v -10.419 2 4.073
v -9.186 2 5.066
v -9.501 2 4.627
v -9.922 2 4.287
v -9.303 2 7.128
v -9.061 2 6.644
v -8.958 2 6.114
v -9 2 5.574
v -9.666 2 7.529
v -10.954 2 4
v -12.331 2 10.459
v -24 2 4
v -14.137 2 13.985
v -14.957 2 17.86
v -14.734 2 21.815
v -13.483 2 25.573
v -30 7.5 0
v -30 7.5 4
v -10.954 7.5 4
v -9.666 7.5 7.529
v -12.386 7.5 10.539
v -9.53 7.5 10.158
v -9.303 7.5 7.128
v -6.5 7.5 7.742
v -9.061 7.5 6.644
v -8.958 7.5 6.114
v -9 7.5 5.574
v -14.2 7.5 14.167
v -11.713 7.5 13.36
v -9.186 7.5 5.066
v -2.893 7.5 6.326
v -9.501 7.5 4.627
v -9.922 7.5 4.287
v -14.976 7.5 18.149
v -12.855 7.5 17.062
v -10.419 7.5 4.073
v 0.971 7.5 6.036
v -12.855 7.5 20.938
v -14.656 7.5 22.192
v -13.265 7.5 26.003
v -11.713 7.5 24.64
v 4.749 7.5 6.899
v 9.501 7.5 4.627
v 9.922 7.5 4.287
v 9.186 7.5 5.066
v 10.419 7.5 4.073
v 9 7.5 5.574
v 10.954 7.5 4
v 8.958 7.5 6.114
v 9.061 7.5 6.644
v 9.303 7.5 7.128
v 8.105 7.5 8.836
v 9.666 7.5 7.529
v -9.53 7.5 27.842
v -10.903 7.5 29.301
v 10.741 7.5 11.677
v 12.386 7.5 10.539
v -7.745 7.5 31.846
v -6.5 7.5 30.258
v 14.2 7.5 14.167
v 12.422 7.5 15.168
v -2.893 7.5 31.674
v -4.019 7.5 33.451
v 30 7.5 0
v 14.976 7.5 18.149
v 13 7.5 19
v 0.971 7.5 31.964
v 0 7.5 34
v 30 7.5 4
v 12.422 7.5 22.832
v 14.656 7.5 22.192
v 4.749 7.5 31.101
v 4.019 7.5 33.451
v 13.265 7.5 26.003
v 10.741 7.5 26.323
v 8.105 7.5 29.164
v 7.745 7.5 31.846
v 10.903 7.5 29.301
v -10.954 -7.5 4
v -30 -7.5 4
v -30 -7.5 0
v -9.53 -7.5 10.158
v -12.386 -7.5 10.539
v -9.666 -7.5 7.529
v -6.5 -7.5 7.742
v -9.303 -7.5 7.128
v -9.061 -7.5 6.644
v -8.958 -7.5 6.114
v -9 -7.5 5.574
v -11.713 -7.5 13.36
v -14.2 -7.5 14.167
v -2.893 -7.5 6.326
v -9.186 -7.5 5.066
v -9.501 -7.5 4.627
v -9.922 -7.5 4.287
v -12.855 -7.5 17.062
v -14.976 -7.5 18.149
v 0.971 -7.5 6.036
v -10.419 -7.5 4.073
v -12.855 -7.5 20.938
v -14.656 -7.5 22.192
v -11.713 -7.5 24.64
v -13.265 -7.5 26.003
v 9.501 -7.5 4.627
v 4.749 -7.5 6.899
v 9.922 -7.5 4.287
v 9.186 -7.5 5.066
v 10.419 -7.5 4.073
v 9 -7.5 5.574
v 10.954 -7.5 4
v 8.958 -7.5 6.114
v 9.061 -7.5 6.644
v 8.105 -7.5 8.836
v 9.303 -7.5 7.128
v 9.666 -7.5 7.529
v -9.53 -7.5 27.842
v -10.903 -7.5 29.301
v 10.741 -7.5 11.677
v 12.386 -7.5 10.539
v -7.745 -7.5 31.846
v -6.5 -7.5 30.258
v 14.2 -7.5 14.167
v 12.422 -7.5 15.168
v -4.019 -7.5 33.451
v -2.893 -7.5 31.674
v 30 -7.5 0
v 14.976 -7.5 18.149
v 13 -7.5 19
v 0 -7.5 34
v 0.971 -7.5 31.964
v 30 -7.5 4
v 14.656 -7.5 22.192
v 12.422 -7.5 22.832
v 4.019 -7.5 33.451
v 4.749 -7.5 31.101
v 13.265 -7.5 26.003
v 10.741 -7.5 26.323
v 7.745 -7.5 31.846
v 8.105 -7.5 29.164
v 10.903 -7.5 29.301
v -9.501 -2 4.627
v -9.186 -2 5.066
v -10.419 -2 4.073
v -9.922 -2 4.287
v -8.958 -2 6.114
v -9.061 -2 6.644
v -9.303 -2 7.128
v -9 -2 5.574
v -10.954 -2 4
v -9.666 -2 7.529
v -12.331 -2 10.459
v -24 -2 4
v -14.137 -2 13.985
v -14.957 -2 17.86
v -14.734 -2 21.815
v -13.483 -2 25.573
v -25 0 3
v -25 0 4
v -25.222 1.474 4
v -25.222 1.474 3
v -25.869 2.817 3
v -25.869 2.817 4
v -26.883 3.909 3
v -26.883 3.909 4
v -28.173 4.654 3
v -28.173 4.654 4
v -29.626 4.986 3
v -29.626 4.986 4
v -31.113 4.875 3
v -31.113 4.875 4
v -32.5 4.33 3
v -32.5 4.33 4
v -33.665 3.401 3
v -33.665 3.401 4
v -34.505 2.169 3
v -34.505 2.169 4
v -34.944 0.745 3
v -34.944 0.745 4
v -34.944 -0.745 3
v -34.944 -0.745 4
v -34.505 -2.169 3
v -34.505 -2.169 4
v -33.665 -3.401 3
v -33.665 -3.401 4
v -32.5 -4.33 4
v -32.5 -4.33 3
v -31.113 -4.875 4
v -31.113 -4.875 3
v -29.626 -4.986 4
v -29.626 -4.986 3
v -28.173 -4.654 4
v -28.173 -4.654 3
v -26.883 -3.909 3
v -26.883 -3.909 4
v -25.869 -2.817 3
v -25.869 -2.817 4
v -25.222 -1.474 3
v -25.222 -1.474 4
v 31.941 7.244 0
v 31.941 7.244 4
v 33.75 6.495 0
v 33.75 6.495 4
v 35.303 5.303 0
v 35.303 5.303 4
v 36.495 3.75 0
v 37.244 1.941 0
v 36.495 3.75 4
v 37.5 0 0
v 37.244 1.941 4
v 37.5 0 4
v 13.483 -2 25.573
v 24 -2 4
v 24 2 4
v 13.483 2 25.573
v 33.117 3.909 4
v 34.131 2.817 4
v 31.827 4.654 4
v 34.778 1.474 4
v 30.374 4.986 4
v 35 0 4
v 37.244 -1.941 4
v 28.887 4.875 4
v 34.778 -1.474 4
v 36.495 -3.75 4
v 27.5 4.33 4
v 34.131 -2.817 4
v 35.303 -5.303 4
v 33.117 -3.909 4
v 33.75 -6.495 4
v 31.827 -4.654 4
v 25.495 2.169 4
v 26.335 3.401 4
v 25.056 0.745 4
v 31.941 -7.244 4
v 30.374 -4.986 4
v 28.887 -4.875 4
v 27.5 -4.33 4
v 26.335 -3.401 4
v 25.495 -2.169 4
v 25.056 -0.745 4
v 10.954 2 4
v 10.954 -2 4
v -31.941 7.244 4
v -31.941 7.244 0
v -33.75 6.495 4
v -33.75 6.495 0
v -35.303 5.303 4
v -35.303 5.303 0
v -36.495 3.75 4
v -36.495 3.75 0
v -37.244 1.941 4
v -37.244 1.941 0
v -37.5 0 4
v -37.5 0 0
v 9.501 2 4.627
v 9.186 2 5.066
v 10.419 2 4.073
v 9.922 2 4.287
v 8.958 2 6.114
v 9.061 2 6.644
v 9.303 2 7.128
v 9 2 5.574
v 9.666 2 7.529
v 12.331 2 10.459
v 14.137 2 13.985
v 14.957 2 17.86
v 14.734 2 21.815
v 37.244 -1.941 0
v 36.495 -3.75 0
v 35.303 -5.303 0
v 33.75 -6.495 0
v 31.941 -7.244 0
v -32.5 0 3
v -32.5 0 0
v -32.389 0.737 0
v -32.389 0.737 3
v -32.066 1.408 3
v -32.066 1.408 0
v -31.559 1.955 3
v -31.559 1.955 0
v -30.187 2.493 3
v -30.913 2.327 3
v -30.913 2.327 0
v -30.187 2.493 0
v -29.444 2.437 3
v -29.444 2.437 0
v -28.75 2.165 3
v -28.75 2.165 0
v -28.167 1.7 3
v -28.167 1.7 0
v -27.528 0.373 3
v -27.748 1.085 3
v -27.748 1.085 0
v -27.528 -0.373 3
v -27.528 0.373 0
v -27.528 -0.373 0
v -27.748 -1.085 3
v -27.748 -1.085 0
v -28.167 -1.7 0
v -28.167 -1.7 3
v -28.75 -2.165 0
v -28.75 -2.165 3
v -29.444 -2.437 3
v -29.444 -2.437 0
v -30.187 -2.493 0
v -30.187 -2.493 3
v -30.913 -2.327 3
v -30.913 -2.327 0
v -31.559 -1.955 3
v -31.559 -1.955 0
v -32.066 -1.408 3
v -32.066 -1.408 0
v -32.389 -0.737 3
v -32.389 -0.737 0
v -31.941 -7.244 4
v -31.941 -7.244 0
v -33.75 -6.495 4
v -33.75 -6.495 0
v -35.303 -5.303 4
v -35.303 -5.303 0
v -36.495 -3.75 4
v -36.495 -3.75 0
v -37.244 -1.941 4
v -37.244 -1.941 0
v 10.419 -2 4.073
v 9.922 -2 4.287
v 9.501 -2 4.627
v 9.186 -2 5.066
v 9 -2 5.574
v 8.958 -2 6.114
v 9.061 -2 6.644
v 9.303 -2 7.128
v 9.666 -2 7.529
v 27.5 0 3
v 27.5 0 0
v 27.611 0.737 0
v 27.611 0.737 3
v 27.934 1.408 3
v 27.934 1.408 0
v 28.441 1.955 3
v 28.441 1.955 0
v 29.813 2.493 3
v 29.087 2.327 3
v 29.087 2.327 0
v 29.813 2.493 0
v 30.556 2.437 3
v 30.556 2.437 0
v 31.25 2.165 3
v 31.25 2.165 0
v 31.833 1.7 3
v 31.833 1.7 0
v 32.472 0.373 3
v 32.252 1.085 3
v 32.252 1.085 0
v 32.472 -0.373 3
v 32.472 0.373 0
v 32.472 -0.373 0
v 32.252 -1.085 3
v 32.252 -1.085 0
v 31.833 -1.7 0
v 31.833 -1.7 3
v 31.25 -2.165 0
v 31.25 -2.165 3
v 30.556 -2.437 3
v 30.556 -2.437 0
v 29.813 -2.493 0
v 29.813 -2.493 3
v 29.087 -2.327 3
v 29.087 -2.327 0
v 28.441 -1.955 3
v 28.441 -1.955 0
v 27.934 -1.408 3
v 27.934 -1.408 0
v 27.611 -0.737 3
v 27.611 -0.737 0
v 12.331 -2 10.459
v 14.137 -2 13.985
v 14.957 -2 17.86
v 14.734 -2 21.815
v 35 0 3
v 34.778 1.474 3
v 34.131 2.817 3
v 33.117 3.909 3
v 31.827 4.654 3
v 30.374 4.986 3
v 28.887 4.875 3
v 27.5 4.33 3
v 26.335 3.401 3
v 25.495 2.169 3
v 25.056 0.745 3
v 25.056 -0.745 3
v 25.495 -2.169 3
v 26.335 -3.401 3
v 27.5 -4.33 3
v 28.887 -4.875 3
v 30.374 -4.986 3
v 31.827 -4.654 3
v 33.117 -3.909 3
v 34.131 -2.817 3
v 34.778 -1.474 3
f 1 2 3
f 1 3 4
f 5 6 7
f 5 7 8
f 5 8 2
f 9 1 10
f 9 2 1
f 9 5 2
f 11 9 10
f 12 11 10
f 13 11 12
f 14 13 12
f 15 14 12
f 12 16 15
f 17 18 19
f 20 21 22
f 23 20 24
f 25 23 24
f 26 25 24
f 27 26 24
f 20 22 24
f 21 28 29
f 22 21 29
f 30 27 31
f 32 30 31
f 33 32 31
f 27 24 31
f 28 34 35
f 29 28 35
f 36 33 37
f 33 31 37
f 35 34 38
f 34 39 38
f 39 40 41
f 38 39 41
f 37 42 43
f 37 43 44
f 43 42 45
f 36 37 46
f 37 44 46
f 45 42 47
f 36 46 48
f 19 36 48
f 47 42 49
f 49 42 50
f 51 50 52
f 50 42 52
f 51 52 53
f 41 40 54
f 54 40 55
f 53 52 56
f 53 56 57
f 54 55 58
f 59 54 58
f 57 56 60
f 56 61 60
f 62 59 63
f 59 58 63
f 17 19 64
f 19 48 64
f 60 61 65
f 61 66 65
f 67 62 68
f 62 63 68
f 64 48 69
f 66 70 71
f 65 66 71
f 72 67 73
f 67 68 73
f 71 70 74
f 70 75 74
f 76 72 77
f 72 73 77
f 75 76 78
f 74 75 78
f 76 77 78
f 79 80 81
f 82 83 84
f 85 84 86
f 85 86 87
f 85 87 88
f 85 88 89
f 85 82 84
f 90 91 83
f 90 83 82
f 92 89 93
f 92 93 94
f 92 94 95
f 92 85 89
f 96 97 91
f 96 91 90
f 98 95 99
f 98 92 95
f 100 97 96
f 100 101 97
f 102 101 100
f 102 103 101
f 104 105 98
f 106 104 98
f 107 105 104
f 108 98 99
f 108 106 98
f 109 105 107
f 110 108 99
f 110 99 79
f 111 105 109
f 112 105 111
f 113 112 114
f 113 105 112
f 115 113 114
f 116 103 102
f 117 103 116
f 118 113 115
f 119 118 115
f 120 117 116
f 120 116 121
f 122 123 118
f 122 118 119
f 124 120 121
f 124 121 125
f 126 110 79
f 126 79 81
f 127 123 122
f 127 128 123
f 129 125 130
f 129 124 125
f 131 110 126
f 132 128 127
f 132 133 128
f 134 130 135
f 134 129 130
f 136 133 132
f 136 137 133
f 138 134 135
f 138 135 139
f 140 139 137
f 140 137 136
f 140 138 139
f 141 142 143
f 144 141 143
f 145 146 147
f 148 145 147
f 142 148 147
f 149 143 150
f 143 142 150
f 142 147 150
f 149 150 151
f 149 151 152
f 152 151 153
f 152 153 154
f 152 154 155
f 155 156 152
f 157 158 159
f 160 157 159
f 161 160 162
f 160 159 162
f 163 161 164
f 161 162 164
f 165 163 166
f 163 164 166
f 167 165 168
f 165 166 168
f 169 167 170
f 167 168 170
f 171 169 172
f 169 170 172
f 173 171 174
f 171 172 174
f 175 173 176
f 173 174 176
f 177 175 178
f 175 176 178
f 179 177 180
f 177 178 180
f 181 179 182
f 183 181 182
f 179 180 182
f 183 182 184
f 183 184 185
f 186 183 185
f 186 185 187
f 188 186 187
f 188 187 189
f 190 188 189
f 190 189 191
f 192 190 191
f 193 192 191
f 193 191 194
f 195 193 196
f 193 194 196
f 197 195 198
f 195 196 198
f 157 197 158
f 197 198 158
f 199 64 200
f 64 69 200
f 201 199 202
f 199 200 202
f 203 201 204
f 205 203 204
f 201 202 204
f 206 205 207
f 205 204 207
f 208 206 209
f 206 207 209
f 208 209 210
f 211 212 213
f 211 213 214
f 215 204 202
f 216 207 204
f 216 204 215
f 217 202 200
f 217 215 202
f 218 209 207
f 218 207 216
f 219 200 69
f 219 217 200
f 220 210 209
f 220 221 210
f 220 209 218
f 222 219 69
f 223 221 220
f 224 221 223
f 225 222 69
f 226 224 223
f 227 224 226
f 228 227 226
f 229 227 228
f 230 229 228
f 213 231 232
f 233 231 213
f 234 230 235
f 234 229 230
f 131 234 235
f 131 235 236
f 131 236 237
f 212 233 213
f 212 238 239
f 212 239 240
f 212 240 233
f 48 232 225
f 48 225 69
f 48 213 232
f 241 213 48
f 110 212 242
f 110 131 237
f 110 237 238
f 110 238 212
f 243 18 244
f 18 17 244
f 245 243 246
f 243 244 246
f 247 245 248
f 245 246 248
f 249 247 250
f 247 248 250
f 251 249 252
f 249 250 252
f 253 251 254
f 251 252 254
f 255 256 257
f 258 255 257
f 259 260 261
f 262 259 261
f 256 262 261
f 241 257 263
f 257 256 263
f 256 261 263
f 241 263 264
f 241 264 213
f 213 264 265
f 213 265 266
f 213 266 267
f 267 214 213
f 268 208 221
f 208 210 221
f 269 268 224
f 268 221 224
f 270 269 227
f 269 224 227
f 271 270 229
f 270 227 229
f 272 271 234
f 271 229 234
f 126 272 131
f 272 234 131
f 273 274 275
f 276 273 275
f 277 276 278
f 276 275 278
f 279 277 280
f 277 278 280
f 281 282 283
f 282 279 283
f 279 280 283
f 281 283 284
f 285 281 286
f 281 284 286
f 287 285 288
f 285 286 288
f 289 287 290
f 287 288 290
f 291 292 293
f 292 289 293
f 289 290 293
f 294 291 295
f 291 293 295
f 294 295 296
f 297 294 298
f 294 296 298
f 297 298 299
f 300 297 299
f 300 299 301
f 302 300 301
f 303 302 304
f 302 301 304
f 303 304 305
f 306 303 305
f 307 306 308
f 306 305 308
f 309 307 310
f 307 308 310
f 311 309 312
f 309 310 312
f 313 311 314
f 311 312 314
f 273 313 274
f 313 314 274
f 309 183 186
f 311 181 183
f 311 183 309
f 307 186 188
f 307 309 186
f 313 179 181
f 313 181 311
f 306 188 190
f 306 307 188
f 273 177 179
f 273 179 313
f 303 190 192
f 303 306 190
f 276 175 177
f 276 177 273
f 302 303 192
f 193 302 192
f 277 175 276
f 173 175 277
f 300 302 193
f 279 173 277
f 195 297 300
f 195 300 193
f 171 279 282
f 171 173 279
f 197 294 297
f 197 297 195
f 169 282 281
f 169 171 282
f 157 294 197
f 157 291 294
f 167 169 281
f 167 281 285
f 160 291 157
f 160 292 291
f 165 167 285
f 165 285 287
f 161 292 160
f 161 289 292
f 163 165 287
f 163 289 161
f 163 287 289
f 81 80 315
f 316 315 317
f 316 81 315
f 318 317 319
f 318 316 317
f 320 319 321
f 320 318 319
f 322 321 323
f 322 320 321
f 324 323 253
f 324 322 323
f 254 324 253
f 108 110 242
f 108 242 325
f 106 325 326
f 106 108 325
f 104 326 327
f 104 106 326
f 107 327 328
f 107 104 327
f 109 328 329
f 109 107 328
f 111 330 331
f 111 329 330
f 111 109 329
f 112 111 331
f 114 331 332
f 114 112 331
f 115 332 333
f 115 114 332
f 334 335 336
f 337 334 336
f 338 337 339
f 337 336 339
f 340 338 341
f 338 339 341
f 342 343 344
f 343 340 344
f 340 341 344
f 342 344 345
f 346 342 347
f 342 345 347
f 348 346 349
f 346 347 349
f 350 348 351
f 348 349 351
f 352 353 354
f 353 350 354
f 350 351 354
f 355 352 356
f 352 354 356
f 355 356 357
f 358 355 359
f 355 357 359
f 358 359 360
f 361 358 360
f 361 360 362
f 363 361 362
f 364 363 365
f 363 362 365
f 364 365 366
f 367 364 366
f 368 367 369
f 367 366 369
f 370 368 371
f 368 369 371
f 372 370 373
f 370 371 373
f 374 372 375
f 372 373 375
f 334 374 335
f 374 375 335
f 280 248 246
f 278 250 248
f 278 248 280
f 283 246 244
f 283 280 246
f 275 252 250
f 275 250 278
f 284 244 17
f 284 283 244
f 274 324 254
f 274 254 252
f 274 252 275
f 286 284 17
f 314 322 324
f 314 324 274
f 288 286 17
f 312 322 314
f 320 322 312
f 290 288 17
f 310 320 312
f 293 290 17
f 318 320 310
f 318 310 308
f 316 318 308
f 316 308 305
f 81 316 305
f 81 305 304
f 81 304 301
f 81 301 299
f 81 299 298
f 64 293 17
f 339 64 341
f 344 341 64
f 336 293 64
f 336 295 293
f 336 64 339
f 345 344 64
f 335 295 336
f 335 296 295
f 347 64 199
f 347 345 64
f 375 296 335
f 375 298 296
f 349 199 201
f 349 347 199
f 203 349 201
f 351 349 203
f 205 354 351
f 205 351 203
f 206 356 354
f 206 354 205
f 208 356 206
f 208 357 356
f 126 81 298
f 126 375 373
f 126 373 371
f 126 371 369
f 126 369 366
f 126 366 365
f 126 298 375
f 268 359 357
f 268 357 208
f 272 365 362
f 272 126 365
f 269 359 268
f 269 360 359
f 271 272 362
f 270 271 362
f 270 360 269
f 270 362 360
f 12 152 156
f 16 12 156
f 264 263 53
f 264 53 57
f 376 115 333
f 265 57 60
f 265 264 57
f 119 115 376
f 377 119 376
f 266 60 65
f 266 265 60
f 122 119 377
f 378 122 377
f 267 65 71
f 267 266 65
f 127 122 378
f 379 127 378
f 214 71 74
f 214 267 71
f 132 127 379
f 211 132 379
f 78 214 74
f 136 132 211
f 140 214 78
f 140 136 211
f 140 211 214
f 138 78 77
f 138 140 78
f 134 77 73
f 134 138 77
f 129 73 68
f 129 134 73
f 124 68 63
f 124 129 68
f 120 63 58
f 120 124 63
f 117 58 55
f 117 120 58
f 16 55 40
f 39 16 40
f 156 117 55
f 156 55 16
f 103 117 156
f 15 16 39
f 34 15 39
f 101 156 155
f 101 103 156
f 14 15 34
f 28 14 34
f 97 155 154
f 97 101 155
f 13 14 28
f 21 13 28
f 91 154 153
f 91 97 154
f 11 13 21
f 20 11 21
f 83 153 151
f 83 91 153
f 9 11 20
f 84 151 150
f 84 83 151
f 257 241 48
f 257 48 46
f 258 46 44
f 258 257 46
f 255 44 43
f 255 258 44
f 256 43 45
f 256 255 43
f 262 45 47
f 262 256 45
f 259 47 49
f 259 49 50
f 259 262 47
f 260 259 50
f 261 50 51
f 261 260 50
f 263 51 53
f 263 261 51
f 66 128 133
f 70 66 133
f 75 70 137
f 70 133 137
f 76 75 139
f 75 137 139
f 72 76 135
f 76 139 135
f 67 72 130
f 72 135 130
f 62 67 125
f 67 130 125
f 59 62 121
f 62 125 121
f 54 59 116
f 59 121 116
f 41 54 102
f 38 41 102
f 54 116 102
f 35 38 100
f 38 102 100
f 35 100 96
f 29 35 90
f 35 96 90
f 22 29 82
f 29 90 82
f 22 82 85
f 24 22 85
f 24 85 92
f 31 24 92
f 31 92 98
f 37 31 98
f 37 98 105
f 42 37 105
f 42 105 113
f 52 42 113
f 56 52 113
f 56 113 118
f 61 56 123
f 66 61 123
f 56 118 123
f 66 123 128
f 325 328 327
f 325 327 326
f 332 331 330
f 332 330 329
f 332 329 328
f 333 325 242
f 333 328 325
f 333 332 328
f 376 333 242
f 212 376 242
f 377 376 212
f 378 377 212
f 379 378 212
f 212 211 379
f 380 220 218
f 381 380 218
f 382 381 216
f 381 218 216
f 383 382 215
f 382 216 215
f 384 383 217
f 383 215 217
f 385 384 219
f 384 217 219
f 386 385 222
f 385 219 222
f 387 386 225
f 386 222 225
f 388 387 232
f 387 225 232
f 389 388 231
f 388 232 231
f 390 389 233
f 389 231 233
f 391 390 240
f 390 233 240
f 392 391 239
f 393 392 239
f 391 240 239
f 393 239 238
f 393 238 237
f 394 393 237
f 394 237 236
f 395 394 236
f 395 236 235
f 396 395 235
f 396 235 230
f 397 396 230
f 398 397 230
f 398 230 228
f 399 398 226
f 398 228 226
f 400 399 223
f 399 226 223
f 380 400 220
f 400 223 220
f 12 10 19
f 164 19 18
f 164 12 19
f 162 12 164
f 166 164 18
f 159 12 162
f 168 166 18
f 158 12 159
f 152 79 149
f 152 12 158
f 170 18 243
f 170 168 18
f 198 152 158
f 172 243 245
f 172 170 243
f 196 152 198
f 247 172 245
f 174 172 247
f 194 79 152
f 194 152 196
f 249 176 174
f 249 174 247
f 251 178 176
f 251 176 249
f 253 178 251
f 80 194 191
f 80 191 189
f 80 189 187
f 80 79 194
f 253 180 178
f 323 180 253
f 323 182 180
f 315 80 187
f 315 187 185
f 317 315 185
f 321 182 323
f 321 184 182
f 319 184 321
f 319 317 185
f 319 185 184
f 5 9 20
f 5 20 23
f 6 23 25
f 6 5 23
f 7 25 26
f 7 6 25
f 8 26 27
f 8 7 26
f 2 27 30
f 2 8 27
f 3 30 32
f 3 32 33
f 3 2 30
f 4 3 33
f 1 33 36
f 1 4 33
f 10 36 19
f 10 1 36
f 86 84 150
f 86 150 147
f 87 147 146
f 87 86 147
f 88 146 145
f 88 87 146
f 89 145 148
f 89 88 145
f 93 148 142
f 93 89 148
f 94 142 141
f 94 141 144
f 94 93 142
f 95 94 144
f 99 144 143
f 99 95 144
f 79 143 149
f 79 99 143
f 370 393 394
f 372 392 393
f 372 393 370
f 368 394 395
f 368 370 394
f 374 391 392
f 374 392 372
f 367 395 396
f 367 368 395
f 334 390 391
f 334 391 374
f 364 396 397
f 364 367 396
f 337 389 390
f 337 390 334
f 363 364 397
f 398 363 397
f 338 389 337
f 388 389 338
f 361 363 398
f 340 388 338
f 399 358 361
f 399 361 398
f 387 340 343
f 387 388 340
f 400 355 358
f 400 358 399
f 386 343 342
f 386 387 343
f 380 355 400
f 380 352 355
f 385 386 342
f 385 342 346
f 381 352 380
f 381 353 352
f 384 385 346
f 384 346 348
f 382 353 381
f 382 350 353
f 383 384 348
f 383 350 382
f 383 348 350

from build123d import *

# Parameters (mm, degrees)
F2_DEPTH       = 7.5
F3_R           = 13
F4_DEPTH       = 15.001
F5_R           = 7.49999
F7_D           = 5
F7_CBORE_D     = 10
F7_CBORE_DEPTH = 1
F9_DEPTH       = 2


# Not quite as in the source:
# - a fillet or chamfer is up to 0.001 mm smaller than in the source, because OpenCascade refuses the exact size


with BuildPart() as f2:
    # F1 (on Front) → F2 (new body, symmetric)
    with BuildSketch(Plane.XZ):
        with BuildLine():
            Line((-37.5, 0), (0, 0))
            Line((0, 0), (37.5, 0))
            Line((37.5, 0), (37.5, 4))
            Line((37.5, 4), (10.9544511501, 4))
            ThreePointArc((10.9544511501, 4), (9.0757782768, 5.3140056594), (9.6656921913, 7.5294117647))
            ThreePointArc((9.6656921913, 7.5294117647), (14.0900465494, 24.1449575543), (0, 34))
            ThreePointArc((0, 34), (-14.0900465494, 24.1449575543), (-9.6656921913, 7.5294117647))
            ThreePointArc((-9.6656921913, 7.5294117647), (-9.0757782768, 5.3140056594), (-10.9544511501, 4))
            Line((-10.9544511501, 4), (-37.5, 4))
            Line((-37.5, 4), (-37.5, 0))
        make_face()
    extrude(amount=F2_DEPTH, both=True)

    # F3 (on face) → F4 (cut, through all)
    with BuildSketch(Plane.XZ.offset(7.5)):
        with Locations((0, 19)):
            Circle(F3_R)
    extrude(amount=-F4_DEPTH, mode=Mode.SUBTRACT)

    # F5 (radius 7.5 in the source; OpenCascade refuses exactly that, so slightly less here)
    f5_edges = [f2.edges().sort_by_distance(p)[0] for p in [
        (37.5, -7.5, 2),
        (37.5, 7.5, 2),
        (-37.5, -7.5, 2),
        (-37.5, 7.5, 2),
    ]]
    fillet(f5_edges, radius=F5_R)

    # F7 (through all)
    with Locations(Plane.XY.offset(4)):
        with Locations((30, 0), (-30, 0)):
            CounterBoreHole(F7_D / 2, F7_CBORE_D / 2, F7_CBORE_DEPTH)

    # F8 (on Front) → F9 (join, symmetric)
    with BuildSketch(Plane.XZ):
        with BuildLine():
            Line((10.9544511501, 4), (24, 4))
            Line((24, 4), (13.4831460674, 25.5730337079))
            ThreePointArc((13.4831460674, 25.5730337079), (14.6751576274, 15.8952055444), (9.6656921913, 7.5294117647))
            ThreePointArc((9.6656921913, 7.5294117647), (9.0757782768, 5.3140056594), (10.9544511501, 4))
        make_face()
    extrude(amount=F9_DEPTH, both=True)

    # F10: F2 across plane


with BuildPart() as f2_1:
    add(f2.part)
    add(f2.part.mirror(Plane.YZ))


solid = f2_1.part
